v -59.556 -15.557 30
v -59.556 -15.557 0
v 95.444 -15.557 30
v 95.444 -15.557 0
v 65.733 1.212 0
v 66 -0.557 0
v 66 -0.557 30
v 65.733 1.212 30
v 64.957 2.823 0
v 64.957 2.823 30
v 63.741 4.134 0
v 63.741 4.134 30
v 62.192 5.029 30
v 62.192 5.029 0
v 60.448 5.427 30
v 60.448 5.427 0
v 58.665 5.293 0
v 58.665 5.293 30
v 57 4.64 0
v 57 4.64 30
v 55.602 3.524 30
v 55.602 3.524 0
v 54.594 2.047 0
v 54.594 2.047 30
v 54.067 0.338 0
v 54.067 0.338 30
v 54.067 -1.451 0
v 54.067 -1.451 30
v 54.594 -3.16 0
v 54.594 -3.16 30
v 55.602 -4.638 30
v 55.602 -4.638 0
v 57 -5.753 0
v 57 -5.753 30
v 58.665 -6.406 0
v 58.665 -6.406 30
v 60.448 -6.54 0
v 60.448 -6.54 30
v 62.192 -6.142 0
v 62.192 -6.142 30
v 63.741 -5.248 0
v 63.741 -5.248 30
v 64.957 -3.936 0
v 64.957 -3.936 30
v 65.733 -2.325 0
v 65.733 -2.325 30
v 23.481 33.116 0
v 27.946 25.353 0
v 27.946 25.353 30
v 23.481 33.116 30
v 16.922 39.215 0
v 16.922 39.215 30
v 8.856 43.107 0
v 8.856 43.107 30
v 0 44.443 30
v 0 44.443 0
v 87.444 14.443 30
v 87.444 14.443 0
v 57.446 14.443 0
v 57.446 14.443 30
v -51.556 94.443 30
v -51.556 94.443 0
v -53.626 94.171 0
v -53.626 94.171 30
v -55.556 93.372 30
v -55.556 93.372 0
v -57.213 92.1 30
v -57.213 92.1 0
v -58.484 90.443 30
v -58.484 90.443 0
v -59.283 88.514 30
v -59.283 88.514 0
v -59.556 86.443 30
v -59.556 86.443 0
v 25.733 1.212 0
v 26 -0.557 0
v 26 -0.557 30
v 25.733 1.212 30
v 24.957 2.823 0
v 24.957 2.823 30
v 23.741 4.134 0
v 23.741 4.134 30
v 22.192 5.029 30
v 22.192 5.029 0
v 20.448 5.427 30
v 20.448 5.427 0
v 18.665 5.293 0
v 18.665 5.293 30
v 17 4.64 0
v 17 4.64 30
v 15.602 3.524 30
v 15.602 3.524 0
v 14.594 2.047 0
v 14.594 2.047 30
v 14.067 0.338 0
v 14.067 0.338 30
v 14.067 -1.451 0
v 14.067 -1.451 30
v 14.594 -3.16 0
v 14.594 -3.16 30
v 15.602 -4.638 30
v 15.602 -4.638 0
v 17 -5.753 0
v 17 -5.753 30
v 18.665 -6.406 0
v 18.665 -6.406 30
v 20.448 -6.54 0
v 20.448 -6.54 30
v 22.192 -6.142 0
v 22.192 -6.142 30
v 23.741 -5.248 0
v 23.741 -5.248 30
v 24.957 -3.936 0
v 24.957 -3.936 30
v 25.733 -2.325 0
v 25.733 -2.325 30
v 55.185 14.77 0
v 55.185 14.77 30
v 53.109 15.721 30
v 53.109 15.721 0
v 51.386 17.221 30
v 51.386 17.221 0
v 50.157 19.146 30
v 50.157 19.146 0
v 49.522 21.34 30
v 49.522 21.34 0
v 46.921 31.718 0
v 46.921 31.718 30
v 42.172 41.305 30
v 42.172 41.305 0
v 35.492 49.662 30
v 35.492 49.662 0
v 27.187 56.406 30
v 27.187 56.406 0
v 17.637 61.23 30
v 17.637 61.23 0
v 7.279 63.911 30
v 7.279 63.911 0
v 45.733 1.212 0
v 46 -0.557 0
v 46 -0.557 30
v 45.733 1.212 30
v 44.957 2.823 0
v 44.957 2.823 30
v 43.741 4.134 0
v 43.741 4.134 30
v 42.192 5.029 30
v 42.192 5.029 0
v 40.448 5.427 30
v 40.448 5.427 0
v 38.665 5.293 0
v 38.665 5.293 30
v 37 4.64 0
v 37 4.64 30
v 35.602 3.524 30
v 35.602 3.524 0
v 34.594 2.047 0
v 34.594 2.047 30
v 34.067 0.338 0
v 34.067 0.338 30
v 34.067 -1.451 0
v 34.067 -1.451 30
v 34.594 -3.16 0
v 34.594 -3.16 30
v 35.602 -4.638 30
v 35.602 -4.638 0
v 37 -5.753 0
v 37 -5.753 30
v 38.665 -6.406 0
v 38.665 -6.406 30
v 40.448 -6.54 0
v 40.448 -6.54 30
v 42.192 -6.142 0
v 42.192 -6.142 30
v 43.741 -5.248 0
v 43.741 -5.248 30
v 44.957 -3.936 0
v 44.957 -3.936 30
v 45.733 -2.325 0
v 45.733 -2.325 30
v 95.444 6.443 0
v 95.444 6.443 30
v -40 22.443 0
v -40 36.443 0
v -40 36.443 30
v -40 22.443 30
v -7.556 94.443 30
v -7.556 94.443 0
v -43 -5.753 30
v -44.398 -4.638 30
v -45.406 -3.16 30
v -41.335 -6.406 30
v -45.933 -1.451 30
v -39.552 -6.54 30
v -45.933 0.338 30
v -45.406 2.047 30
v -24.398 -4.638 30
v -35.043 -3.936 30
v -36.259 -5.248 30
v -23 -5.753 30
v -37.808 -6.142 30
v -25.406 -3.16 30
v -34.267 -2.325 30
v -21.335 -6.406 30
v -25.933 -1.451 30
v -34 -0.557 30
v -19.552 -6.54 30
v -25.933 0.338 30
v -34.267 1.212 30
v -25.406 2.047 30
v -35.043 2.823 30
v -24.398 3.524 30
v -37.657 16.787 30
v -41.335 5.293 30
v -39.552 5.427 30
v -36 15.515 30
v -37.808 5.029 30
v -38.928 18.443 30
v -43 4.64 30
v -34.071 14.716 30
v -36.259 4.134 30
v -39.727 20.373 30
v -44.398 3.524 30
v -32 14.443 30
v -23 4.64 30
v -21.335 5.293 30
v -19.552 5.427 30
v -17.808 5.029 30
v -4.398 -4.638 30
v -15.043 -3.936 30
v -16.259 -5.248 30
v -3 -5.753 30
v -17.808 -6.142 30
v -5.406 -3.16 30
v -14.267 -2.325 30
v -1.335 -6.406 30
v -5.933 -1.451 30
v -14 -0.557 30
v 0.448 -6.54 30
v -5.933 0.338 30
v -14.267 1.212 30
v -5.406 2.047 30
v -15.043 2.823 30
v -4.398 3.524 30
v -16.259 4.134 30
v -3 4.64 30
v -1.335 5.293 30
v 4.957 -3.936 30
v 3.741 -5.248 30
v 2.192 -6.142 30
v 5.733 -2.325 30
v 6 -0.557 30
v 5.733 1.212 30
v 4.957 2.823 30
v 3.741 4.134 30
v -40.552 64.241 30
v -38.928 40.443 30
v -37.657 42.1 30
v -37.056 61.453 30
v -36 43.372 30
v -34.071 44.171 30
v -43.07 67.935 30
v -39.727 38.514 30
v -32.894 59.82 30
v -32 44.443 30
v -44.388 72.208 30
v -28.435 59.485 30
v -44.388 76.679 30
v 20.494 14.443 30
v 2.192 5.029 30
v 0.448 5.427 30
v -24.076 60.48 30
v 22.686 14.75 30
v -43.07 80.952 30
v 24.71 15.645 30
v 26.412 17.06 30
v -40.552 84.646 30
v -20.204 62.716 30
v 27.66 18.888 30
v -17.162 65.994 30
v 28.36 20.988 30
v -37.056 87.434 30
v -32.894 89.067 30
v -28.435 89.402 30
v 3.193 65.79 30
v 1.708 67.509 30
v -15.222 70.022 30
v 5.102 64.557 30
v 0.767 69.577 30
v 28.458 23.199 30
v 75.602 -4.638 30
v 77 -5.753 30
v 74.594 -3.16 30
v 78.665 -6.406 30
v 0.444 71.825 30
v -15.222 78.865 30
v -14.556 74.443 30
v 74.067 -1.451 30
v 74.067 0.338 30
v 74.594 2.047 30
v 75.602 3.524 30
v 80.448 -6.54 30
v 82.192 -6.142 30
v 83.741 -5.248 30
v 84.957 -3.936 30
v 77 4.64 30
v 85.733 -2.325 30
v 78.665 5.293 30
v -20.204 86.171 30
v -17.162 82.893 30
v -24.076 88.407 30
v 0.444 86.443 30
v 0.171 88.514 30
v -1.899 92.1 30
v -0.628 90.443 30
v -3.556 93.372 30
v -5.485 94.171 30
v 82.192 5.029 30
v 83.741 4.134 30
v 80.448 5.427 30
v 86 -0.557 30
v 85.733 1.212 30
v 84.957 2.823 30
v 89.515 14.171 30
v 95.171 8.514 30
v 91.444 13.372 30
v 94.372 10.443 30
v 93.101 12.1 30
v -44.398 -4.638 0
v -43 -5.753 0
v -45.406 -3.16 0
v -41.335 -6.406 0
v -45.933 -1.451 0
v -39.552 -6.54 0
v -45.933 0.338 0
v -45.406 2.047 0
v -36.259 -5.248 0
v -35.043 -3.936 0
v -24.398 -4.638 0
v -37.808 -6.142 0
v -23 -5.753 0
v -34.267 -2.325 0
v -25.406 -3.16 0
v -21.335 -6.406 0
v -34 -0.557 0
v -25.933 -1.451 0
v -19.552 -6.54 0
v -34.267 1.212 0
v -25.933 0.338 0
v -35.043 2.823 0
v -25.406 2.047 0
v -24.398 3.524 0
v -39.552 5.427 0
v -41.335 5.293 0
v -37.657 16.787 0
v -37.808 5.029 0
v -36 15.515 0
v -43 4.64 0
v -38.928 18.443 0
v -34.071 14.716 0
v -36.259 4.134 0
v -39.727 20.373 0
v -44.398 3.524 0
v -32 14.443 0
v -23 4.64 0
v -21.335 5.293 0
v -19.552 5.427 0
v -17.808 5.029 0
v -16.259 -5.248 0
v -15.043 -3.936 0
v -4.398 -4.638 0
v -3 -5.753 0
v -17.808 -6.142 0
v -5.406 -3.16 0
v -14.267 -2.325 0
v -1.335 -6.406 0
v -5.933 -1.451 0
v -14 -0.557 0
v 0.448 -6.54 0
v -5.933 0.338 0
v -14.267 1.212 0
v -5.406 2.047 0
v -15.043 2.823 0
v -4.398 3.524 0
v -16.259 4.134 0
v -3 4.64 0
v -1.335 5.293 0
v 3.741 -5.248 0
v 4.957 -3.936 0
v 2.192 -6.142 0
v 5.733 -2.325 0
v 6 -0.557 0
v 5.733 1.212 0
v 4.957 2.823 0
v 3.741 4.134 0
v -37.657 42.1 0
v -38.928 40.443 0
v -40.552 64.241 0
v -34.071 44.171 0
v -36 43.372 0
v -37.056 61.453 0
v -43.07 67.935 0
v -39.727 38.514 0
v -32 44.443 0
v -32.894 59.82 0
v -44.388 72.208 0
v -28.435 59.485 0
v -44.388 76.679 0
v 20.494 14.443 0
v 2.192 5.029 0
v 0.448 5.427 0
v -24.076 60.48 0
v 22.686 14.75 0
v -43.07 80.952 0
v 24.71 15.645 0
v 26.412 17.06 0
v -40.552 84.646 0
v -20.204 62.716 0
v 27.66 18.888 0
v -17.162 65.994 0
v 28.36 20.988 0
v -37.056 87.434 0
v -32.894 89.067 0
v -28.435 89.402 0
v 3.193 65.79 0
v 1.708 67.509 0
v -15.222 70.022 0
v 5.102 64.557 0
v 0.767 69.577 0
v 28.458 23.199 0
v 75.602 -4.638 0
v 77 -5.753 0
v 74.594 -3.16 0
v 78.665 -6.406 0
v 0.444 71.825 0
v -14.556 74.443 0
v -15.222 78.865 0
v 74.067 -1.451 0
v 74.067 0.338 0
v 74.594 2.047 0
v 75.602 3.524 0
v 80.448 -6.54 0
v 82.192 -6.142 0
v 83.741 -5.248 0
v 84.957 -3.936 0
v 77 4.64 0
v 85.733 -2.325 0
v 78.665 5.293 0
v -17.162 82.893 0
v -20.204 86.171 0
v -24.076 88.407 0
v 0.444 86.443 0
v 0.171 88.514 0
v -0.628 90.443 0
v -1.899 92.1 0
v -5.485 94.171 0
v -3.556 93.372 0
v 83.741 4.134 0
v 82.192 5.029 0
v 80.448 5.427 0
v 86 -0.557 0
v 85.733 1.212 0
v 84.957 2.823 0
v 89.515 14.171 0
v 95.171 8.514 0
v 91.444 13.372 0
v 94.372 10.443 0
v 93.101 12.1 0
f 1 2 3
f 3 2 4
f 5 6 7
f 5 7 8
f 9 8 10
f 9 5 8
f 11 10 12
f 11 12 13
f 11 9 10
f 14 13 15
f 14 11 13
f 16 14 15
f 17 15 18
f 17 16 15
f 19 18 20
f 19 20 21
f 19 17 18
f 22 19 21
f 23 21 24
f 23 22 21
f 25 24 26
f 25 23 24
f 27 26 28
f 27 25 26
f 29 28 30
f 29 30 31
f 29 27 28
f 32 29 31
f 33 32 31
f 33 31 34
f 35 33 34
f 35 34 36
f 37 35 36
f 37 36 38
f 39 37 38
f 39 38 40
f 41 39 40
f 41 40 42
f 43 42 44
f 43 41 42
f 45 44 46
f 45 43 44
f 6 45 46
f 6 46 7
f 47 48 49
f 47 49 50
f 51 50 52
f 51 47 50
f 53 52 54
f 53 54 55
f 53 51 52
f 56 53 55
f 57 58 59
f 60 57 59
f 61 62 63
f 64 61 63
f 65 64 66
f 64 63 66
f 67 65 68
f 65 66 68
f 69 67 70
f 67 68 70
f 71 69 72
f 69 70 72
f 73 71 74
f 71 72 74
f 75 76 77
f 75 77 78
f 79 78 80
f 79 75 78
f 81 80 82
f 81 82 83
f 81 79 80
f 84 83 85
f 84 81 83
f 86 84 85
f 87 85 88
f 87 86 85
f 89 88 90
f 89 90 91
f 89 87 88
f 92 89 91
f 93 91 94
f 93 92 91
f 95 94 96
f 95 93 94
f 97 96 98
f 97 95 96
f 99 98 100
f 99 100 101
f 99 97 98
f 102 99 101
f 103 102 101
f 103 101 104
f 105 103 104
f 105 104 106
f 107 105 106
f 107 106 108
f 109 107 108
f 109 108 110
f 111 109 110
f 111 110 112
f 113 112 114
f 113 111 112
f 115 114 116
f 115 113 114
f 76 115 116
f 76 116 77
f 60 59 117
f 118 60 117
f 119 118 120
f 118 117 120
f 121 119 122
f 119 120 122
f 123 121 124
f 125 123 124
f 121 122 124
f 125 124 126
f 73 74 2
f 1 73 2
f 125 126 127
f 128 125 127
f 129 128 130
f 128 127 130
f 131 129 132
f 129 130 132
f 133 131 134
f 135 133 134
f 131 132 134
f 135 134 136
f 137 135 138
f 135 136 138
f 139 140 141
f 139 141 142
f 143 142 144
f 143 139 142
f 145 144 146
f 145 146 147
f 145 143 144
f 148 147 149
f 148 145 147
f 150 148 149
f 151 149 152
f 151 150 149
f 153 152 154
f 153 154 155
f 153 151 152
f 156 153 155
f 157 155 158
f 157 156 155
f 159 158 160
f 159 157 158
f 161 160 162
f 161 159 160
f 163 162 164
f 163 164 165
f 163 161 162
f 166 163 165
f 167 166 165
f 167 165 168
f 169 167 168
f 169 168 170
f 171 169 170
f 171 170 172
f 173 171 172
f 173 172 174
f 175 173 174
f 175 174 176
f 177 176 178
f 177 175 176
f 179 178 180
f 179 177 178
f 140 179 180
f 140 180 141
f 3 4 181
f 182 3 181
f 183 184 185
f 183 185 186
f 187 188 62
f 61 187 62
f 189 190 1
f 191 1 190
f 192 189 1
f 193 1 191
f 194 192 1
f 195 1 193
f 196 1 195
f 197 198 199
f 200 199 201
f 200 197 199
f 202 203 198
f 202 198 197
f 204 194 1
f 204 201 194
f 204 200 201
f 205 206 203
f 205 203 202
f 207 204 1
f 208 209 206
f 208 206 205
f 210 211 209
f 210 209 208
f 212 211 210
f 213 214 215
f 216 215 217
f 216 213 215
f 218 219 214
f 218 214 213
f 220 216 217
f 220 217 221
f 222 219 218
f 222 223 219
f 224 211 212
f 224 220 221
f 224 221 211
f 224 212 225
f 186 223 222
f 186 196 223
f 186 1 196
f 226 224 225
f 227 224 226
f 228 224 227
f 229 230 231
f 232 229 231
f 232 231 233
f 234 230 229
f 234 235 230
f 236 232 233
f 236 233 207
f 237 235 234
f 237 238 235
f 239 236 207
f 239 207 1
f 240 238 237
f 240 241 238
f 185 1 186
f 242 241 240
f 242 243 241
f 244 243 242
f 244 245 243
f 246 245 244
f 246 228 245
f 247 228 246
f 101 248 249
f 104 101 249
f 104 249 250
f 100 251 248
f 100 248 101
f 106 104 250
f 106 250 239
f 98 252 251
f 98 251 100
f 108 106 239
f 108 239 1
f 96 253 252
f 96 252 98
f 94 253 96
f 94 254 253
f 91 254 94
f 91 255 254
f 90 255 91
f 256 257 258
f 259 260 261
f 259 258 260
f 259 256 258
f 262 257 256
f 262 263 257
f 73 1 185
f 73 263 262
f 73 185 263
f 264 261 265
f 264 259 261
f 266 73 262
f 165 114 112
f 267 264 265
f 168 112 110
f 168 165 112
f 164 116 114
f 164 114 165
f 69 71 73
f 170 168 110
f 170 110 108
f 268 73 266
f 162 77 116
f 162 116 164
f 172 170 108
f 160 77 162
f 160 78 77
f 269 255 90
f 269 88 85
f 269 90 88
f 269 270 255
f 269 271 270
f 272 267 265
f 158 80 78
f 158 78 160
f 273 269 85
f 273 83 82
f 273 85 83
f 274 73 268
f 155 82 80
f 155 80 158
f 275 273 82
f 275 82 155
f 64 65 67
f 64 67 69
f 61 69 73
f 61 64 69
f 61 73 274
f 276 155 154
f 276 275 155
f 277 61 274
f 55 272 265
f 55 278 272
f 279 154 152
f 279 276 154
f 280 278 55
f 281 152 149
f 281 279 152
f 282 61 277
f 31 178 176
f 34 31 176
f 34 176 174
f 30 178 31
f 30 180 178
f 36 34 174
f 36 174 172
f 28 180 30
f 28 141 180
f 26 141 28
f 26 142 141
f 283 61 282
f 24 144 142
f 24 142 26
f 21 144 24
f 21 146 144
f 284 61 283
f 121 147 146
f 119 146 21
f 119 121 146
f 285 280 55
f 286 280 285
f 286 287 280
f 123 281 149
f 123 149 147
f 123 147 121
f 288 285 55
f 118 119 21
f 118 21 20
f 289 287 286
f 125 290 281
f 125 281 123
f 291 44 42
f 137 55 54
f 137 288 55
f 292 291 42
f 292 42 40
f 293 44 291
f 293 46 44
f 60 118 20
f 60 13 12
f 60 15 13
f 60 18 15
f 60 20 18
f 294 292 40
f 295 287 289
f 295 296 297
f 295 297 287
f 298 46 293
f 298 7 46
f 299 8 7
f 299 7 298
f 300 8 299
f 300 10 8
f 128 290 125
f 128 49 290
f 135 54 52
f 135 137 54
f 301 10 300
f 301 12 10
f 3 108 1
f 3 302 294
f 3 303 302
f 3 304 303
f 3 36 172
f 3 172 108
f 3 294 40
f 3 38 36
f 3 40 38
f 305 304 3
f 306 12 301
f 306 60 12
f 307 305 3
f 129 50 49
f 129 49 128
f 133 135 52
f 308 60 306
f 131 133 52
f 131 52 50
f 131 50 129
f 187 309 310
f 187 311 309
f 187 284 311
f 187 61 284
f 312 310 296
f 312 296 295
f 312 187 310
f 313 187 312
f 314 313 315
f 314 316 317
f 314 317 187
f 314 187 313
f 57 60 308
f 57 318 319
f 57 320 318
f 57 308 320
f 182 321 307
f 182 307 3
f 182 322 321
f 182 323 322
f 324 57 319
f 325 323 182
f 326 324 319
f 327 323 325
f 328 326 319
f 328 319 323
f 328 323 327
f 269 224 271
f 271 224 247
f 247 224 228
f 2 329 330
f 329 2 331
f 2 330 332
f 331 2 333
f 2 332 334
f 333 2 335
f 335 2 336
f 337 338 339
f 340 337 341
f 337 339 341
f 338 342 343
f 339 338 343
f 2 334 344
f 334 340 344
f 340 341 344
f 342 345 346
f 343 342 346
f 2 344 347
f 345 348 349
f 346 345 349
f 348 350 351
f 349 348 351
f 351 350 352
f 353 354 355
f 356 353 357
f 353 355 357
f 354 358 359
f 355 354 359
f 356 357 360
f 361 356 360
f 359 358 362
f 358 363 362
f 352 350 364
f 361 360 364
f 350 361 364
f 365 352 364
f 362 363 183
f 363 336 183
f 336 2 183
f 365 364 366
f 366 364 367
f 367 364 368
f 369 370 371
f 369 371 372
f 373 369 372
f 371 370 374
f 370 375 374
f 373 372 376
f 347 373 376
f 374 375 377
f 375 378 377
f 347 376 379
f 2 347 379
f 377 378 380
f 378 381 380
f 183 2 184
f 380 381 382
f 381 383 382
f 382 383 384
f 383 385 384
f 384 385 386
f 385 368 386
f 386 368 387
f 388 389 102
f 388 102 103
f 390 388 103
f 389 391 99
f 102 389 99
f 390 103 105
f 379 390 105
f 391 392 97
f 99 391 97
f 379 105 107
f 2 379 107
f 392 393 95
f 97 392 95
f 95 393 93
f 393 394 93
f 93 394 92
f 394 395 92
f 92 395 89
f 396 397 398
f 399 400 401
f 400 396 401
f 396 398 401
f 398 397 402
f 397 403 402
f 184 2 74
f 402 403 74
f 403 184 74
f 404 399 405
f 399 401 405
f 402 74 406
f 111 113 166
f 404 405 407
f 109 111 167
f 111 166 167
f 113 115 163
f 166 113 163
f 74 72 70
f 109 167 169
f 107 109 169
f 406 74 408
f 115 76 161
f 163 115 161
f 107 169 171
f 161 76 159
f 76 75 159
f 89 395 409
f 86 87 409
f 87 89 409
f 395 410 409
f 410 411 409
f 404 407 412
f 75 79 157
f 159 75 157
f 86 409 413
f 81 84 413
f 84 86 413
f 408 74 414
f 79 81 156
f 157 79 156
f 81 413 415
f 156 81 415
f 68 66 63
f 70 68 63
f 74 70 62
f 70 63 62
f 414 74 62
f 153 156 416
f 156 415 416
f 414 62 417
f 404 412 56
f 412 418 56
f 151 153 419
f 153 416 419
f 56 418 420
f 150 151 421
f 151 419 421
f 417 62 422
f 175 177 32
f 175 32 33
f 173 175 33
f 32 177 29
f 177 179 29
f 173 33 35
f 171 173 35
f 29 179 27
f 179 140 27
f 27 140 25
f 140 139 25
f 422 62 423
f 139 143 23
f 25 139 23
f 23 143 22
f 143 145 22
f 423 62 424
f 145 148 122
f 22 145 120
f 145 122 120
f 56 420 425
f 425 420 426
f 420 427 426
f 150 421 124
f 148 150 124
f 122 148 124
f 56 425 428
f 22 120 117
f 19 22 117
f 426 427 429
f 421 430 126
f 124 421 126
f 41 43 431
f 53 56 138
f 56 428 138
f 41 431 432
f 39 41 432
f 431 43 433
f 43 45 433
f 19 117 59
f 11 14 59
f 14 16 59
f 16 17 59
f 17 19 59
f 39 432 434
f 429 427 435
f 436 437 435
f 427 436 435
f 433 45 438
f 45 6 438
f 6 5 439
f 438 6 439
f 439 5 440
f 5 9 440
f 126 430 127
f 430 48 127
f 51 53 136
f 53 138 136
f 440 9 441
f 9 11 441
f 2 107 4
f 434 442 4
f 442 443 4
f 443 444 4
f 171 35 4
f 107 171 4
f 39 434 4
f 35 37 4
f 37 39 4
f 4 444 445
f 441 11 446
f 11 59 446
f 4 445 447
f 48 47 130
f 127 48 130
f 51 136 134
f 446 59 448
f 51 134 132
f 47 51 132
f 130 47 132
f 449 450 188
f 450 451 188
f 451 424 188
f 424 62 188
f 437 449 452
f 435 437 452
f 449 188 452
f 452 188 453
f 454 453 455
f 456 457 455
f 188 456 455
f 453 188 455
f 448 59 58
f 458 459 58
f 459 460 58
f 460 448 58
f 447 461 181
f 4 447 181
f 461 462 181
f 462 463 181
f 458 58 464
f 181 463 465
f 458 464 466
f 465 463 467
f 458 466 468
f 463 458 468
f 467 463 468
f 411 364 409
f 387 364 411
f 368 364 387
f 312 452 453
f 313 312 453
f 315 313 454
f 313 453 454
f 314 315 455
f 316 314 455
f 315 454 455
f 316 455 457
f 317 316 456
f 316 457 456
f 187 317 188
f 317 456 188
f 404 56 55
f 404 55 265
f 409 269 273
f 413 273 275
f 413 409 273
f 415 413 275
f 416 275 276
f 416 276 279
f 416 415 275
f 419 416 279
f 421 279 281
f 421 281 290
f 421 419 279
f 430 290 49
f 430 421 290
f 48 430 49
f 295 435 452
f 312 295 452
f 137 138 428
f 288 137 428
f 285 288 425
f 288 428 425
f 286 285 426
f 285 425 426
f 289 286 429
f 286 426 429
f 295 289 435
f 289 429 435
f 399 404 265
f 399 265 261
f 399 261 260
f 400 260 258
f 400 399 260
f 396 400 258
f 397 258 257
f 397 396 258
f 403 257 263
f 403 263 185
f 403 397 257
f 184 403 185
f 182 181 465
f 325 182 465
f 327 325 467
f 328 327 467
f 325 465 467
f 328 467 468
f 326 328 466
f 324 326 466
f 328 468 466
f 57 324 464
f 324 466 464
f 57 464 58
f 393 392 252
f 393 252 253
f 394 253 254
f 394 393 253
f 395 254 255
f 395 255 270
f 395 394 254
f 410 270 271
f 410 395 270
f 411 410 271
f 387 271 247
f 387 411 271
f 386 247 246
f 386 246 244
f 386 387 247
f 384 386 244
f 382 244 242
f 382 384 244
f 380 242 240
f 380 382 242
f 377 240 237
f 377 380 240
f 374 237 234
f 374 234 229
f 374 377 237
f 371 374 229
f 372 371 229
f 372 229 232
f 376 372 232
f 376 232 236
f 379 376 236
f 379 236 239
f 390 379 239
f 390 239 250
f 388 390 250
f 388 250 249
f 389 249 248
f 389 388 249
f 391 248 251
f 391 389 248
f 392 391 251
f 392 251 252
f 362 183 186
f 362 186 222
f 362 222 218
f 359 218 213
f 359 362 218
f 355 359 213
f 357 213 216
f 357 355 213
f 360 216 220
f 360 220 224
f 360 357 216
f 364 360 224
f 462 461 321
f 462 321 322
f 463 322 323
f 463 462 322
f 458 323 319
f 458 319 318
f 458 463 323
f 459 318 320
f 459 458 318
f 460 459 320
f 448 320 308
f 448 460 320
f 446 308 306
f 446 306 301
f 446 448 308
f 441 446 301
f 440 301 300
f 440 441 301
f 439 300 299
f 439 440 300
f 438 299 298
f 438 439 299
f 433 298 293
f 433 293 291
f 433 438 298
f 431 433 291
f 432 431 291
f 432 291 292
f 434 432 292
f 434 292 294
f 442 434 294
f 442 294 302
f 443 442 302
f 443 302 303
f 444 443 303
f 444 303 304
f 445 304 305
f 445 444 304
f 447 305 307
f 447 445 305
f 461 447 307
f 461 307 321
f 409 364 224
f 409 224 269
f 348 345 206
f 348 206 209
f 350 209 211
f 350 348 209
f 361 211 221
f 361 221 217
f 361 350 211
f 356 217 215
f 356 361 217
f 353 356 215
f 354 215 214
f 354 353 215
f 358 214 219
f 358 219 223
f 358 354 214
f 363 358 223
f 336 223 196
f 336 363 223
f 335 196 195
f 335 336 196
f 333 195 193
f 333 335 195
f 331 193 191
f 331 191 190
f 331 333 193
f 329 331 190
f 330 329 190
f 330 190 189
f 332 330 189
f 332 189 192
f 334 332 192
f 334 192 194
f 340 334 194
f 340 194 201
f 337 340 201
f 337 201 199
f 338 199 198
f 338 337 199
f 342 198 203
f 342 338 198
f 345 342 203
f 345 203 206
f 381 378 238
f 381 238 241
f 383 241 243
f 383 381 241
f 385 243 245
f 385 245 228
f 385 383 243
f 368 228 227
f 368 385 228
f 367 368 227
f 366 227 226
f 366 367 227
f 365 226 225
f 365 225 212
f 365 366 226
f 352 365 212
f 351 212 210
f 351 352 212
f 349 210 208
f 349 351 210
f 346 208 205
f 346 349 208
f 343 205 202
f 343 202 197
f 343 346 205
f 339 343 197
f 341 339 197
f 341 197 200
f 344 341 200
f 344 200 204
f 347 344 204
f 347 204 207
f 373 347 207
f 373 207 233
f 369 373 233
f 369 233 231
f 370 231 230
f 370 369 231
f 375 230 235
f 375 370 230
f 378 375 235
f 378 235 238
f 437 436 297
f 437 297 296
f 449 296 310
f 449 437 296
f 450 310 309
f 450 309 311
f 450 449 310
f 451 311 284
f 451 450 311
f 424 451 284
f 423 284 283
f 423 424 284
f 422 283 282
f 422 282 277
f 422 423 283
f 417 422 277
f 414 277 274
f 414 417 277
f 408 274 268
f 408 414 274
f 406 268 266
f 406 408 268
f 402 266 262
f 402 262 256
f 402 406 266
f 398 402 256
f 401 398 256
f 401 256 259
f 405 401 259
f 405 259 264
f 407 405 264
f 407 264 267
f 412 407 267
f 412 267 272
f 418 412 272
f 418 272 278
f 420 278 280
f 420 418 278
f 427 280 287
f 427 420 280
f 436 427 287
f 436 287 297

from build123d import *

# Parameters (mm, degrees)
SKETCH1_R           = 15
SKETCH1_R_2         = 6
BOSS_EXTRUDE1_DEPTH = 30


with BuildPart() as part:
    # Sketch1 → Boss-Extrude1 (new body)
    with BuildSketch(Plane.XY):
        with BuildLine():
            Line((-59.555920585, -15.55654054), (95.444079415, -15.55654054))
            Line((95.444079415, -15.55654054), (95.444079415, 6.44345946))
            ThreePointArc((95.444079415, 6.44345946), (93.100933664, 12.100313709), (87.444079415, 14.44345946))
            Line((87.444079415, 14.44345946), (57.445626465, 14.44345946))
            ThreePointArc((57.445626465, 14.44345946), (52.193369151, 16.409075224), (49.522091781, 21.340011184))
            ThreePointArc((49.522091781, 21.340011184), (35.491805322, 49.661803472), (7.279378806, 63.910727872))
            ThreePointArc((7.279378806, 63.910727872), (2.389428109, 66.596609718), (0.444079415, 71.825490818))
            Line((0.444079415, 71.825490818), (0.444079415, 86.44345946))
            ThreePointArc((0.444079415, 86.44345946), (-1.899066336, 92.100313709), (-7.555920585, 94.44345946))
            Line((-7.555920585, 94.44345946), (-51.555920585, 94.44345946))
            ThreePointArc((-51.555920585, 94.44345946), (-57.212774835, 92.100313709), (-59.555920585, 86.44345946))
            Line((-59.555920585, 86.44345946), (-59.555920585, -15.55654054))
        make_face()
        with Locations((-29.555920585, 74.44345946)):
            Circle(SKETCH1_R, mode=Mode.SUBTRACT)
        with Locations((-40, -0.55654054)):
            Circle(SKETCH1_R_2, mode=Mode.SUBTRACT)
        with Locations((-20, -0.55654054)):
            Circle(SKETCH1_R_2, mode=Mode.SUBTRACT)
        with Locations((0, -0.55654054)):
            Circle(SKETCH1_R_2, mode=Mode.SUBTRACT)
        with Locations((20, -0.55654054)):
            Circle(SKETCH1_R_2, mode=Mode.SUBTRACT)
        with Locations((40, -0.55654054)):
            Circle(SKETCH1_R_2, mode=Mode.SUBTRACT)
        with Locations((60, -0.55654054)):
            Circle(SKETCH1_R_2, mode=Mode.SUBTRACT)
        with Locations((80, -0.55654054)):
            Circle(SKETCH1_R_2, mode=Mode.SUBTRACT)
        with BuildLine():
            Line((0, 44.44345946), (-32, 44.44345946))
            ThreePointArc((-32, 44.44345946), (-37.656854249, 42.100313709), (-40, 36.44345946))
            Line((-40, 36.44345946), (-40, 22.44345946))
            ThreePointArc((-40, 22.44345946), (-37.656854249, 16.78660521), (-32, 14.44345946))
            Line((-32, 14.44345946), (20.493901532, 14.44345946))
            ThreePointArc((20.493901532, 14.44345946), (27.099684123, 17.930850861), (27.946229362, 25.352550369))
            ThreePointArc((27.946229362, 25.352550369), (16.922282245, 39.215144175), (0, 44.44345946))
        make_face(mode=Mode.SUBTRACT)
    extrude(amount=BOSS_EXTRUDE1_DEPTH)


solid = part.part
